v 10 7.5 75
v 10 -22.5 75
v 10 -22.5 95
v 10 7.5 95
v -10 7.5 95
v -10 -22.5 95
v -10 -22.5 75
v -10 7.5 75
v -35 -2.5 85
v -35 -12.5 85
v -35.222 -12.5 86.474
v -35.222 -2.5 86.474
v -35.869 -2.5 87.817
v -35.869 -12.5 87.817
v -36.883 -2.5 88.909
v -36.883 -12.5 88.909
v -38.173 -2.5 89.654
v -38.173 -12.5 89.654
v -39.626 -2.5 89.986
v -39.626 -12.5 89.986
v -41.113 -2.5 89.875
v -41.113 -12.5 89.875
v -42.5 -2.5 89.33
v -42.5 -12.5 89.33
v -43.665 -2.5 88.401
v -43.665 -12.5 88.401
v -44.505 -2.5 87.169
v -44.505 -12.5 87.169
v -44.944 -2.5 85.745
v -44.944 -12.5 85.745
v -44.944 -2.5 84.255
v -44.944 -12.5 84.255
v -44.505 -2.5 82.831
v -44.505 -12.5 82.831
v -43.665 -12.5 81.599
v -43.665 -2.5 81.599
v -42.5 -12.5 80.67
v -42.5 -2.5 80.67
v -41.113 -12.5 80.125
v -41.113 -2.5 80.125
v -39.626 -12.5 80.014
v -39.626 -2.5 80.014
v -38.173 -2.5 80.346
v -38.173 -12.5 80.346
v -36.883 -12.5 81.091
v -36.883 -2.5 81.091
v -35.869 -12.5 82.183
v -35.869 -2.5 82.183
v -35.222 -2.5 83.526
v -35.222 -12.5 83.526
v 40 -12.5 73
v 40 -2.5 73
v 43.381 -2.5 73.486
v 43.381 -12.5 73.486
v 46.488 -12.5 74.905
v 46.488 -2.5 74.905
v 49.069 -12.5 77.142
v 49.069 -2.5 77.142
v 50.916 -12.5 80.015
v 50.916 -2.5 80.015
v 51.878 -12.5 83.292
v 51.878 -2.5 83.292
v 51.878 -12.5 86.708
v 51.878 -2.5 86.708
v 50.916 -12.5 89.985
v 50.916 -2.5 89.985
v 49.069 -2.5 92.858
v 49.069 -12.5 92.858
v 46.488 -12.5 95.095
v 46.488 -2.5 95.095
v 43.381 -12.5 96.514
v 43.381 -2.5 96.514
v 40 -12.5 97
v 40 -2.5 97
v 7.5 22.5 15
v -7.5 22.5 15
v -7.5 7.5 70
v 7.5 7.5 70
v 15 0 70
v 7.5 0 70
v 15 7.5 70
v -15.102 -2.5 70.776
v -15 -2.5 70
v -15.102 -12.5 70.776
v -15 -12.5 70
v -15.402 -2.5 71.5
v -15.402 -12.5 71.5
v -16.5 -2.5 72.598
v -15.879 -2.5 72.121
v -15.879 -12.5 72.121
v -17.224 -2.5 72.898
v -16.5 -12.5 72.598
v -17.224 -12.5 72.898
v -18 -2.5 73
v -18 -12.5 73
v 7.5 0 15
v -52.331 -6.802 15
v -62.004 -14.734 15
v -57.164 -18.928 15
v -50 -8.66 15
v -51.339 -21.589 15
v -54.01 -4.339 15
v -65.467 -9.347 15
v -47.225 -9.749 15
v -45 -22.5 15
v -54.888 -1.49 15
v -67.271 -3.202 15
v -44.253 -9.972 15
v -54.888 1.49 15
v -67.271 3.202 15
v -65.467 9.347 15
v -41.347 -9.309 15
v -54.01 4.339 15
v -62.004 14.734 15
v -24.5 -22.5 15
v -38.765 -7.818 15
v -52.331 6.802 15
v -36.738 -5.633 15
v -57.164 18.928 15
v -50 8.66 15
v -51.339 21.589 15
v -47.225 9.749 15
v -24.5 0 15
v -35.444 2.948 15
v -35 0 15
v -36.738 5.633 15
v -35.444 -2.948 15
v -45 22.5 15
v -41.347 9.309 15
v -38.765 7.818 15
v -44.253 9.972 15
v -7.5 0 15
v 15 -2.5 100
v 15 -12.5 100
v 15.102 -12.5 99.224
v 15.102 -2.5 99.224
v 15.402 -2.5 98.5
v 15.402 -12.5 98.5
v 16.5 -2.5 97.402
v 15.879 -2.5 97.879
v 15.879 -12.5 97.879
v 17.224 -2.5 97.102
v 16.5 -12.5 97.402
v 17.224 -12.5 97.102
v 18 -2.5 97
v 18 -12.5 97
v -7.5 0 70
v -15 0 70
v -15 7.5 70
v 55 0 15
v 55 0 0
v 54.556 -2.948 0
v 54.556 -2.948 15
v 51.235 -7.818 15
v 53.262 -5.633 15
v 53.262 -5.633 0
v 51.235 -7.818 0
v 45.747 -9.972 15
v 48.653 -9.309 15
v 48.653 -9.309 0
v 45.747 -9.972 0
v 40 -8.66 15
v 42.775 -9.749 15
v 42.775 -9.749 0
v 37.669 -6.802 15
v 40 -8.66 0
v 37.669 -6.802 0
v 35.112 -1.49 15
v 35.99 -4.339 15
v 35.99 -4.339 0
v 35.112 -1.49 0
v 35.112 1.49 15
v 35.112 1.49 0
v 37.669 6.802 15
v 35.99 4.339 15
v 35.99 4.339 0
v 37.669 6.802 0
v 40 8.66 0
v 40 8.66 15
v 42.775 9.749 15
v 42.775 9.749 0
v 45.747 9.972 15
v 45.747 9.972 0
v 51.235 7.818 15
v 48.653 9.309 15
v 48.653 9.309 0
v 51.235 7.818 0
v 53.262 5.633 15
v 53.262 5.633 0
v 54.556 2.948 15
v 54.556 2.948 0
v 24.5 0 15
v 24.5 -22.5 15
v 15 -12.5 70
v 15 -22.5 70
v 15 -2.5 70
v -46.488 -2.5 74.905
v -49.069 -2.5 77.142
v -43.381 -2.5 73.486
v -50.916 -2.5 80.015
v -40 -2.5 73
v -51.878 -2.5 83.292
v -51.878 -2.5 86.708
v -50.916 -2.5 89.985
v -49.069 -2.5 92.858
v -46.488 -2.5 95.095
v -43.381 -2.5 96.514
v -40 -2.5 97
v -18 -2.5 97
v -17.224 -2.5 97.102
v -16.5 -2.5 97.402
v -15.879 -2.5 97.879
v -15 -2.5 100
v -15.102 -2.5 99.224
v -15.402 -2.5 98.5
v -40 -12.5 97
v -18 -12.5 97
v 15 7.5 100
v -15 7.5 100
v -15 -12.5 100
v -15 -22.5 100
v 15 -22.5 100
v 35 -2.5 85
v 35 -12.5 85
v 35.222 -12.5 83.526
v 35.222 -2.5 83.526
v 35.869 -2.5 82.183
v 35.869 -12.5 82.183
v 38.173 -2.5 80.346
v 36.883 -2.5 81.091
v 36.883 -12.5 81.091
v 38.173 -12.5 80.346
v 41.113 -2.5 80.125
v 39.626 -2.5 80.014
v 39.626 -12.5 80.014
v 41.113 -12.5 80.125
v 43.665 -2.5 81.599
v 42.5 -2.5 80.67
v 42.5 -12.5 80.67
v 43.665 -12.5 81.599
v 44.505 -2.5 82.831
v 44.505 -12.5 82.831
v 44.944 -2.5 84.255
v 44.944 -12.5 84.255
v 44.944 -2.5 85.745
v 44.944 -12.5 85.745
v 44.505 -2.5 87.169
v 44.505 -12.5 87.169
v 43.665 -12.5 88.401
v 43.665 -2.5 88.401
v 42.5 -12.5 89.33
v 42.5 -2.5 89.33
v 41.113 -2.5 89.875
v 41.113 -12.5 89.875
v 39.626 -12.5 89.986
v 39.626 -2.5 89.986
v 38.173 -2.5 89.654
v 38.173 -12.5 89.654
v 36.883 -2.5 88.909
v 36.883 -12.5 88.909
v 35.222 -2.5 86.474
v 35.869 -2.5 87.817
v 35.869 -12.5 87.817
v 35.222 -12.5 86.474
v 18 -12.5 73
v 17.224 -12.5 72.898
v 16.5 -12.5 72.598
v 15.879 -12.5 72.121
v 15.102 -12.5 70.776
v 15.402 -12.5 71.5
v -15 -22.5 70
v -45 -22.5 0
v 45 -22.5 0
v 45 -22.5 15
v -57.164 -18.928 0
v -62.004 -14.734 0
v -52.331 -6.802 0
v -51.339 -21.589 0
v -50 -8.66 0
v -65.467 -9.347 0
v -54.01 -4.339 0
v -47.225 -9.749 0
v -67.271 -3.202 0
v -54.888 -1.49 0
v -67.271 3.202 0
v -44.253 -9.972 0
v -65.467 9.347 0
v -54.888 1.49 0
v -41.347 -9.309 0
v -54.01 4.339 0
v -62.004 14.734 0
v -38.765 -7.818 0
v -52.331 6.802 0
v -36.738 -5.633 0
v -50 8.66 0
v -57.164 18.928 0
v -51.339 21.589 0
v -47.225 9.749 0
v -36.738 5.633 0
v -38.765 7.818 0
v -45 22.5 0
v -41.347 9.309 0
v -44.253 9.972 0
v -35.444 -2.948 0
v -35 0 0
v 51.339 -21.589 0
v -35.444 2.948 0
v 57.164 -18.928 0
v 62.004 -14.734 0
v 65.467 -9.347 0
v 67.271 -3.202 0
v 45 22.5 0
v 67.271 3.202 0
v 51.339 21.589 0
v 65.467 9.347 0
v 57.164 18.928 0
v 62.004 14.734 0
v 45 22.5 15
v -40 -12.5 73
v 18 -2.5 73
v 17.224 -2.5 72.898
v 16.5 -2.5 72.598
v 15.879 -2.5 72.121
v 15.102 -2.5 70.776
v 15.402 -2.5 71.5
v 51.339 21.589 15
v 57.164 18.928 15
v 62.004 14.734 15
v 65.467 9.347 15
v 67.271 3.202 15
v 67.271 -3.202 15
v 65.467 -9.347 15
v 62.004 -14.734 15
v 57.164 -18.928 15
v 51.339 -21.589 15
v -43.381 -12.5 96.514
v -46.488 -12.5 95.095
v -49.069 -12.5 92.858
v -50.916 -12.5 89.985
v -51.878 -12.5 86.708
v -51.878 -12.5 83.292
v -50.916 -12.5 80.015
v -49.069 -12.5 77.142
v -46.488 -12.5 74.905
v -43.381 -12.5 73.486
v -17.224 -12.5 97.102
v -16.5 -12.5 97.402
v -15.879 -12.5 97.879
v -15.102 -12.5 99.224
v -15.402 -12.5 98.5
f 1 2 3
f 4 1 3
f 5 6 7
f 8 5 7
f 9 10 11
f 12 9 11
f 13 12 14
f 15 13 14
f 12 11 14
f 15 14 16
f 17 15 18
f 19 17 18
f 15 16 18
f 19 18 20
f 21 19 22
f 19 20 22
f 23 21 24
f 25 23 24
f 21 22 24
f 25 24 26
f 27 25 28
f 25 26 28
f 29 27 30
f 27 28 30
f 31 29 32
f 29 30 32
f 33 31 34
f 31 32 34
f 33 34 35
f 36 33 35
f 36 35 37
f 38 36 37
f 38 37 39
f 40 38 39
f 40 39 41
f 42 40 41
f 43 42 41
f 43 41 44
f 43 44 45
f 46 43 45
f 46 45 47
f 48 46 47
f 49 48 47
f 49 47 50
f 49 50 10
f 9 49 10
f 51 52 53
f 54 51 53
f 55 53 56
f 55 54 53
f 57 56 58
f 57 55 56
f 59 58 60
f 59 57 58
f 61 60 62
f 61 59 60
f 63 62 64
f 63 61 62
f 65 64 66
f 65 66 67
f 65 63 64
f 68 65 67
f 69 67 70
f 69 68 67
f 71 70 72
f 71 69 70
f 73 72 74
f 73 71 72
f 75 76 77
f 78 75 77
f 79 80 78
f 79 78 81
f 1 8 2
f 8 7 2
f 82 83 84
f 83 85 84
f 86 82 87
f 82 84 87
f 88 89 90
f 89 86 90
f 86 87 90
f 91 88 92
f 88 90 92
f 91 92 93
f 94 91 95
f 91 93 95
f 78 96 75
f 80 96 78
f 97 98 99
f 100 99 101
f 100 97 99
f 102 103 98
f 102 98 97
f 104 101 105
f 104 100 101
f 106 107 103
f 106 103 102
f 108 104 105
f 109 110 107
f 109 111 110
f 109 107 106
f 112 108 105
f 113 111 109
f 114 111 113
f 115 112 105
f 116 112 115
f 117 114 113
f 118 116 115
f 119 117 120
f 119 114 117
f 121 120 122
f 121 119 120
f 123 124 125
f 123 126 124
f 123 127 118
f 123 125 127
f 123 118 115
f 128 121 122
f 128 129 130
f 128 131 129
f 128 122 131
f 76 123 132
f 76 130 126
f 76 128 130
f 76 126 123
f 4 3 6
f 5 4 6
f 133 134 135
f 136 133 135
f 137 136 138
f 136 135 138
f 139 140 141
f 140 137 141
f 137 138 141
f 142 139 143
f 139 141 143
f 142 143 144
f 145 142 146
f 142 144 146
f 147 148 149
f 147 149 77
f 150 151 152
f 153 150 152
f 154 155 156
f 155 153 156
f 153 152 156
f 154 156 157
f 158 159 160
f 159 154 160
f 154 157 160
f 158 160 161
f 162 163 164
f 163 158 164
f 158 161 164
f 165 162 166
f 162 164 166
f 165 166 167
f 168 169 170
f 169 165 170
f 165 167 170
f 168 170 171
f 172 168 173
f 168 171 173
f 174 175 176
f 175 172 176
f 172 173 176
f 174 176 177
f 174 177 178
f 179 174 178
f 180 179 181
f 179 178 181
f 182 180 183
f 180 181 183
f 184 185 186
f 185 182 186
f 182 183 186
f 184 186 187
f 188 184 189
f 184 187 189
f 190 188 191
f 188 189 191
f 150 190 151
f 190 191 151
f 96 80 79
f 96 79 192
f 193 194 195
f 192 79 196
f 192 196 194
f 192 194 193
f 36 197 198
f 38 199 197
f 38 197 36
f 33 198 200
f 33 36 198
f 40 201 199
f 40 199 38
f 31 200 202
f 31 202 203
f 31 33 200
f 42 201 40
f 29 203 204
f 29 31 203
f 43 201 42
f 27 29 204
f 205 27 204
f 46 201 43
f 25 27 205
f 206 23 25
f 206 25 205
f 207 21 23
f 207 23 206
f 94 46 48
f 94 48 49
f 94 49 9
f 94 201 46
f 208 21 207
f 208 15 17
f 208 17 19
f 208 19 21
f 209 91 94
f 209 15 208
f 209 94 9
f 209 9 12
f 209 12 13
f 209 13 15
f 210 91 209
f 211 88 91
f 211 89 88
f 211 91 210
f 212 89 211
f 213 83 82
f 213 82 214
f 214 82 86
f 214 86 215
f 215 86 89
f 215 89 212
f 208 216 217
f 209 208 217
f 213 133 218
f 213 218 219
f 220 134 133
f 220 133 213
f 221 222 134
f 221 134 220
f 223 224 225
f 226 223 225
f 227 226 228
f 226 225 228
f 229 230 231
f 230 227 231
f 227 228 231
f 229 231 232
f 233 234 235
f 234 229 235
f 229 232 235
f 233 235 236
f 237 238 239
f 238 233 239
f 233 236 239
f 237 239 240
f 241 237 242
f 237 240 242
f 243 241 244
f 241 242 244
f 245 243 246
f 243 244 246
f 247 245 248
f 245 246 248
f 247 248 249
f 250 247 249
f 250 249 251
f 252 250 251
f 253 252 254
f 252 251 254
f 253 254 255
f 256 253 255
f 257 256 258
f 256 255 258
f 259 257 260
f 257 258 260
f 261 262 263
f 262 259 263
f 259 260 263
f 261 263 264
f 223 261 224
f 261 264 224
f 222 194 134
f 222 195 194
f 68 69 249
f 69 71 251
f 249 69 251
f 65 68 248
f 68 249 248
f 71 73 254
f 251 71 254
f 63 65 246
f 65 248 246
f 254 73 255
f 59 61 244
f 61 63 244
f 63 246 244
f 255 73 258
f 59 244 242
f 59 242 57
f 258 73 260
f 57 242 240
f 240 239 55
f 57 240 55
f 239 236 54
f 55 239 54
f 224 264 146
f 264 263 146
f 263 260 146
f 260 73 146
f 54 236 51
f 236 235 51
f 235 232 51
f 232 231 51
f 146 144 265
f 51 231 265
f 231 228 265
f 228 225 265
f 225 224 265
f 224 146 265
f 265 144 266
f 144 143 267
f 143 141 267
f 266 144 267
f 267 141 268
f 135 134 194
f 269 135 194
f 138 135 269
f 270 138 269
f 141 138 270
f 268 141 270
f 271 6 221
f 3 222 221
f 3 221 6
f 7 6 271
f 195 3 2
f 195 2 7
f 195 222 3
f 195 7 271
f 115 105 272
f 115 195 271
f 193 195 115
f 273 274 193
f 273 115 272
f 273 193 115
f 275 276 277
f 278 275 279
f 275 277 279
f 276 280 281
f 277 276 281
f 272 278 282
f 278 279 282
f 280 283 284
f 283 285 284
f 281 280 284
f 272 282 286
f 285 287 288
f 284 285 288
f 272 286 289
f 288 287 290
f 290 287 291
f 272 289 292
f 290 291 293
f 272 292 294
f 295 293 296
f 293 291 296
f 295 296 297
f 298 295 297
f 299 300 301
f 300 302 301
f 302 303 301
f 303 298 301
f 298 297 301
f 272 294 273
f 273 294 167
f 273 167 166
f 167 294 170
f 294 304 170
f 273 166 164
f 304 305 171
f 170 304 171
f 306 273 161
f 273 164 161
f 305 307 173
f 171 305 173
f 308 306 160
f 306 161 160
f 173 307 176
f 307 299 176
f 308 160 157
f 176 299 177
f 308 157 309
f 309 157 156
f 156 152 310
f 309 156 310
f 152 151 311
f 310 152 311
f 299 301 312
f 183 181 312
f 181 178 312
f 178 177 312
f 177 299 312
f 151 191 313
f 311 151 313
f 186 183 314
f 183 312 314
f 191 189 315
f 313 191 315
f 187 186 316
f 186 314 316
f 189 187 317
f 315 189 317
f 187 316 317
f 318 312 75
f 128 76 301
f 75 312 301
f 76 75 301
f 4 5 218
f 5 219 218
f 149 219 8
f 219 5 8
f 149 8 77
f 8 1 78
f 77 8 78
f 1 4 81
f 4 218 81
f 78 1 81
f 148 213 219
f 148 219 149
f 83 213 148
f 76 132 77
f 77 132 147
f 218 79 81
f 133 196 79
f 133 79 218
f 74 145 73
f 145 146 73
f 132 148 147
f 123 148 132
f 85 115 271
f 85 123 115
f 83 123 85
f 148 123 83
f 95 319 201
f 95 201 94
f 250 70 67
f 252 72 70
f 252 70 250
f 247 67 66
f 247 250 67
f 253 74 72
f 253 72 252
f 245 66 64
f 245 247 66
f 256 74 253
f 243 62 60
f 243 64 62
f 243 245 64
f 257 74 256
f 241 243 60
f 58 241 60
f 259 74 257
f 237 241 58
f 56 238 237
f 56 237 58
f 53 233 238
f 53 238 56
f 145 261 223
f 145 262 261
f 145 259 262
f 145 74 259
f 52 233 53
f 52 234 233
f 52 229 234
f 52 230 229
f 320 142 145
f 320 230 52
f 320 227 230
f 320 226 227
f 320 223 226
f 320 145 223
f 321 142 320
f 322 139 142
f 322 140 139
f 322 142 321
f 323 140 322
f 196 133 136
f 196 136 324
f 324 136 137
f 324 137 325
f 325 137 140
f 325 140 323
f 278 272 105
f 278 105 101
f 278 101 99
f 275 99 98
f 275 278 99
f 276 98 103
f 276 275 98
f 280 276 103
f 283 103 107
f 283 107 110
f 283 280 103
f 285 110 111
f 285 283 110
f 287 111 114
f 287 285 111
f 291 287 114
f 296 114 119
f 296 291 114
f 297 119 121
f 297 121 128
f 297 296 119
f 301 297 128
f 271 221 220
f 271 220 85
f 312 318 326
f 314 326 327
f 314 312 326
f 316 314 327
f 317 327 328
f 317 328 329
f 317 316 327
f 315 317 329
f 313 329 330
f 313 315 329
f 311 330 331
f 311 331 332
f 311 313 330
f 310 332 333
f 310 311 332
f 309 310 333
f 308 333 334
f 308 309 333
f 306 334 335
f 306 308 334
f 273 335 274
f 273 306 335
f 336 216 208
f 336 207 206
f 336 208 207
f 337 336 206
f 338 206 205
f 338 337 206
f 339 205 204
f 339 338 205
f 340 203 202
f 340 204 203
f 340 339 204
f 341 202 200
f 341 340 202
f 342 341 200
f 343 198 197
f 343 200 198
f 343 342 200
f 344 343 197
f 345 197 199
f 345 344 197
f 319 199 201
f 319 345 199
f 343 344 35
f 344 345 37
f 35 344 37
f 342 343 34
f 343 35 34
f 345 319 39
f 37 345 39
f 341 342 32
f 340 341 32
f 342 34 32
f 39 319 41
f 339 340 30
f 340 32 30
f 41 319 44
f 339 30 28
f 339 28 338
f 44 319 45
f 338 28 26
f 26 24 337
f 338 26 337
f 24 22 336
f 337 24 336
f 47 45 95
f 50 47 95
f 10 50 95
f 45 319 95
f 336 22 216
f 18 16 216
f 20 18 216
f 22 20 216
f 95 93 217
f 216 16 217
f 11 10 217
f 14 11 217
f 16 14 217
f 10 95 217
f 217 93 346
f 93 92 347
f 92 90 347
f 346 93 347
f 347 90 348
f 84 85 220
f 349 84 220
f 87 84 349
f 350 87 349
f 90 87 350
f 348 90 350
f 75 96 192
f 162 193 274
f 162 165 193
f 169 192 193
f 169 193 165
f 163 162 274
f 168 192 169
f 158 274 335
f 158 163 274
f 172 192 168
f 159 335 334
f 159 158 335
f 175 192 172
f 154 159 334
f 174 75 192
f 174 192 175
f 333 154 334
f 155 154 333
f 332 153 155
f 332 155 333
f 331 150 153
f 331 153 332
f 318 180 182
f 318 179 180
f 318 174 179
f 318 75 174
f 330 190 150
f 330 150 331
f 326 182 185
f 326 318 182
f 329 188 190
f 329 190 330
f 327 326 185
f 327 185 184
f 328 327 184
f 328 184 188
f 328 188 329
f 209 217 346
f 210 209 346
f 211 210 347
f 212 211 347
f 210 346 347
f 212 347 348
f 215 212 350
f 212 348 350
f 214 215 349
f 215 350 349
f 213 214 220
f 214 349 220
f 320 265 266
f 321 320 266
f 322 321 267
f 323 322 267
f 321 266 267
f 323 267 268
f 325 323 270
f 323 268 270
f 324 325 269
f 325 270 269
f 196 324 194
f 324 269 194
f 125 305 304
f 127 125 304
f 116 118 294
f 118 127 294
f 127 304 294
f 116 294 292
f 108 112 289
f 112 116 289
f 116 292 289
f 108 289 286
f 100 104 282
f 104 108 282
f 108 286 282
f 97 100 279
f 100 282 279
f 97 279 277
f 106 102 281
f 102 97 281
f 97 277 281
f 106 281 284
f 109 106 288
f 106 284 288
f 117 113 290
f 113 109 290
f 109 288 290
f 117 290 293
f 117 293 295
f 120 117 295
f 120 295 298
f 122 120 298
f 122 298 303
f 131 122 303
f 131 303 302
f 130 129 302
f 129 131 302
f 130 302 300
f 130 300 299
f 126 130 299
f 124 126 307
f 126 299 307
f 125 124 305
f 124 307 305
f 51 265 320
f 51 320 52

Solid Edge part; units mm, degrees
sketch "Sketch1" plane through (0, 0, 0) normal (0, 0, 1) x (1, 0, 0)
  line L0 (-45, -22.5) -> (45, -22.5)
  line L1 (45, 22.5) -> (-45, 22.5)
  arc A0 (45, 22.5) -> (45, -22.5) centre (45, 0) cw
  arc A1 (-45, -22.5) -> (-45, 22.5) centre (-45, 0) cw
  circle A2 centre (-45, 0) radius 10
  circle A3 centre (45, 0) radius 10
extrude "Protrusion1" add sketch "Sketch1" along normal blind 15
sketch "Sketch2" plane through (0, -22.5, 7.5) normal (0, -1, 0) x (1, 0, 0)
  line L0 (15, 92.5) -> (-15, 92.5)
  line L1 (-15, 92.5) -> (-15, 62.5)
  line L2 (-15, 62.5) -> (15, 62.5)
  line L3 (15, 62.5) -> (15, 92.5)
  line L4 (10, 87.5) -> (-10, 87.5)
  line L5 (-10, 87.5) -> (-10, 67.5)
  line L6 (-10, 67.5) -> (10, 67.5)
  line L7 (10, 67.5) -> (10, 87.5)
extrude "ExtrudedProtrusion_2" add sketch "Sketch2" against normal blind 30
sketch "Sketch3" plane through (0, -12.5, 7.5) normal (0, -1, 0) x (1, 0, 0)
  line L0 (-40, 89.5) -> (-18, 89.5)
  arc A0 (-18, 89.5) -> (-15, 92.5) centre (-18, 92.5) ccw
  line L1 (-15, 62.5) -> (-15, 92.5)
  arc A1 (-18, 65.5) -> (-15, 62.5) centre (-18, 62.5) cw
  line L2 (-40, 65.5) -> (-18, 65.5)
  arc A2 (-40, 65.5) -> (-40, 89.5) centre (-40, 77.5) cw
  circle A3 centre (-40, 77.5) radius 5
extrude "ExtrudedProtrusion_3" add sketch "Sketch3" against normal blind 10
sketch "Sketch4" plane through (0, 0, 0) normal (0, -1, 0) x (1, 0, 0)
  line L0 (-24.5, 15) -> (-15, 70)
  line L1 (-15, 70) -> (0, 70)
  line L2 (0, 70) -> (0, 15)
  line L3 (0, 15) -> (-24.5, 15)
extrude "Protrusion2" add sketch "Sketch4" along normal up to vertex (22.5 mm away)
mirror "Mirror1" about plane through (0, 0, 0) normal (1, 0, 0) of "Protrusion2", "ExtrudedProtrusion_3"
sketch "Sketch5" plane through (0, 0, 0) normal (1, 0, 0) x (0, 1, 0)
  line L0 (22.5, 15) -> (7.5, 70)
  line L1 (7.5, 70) -> (0, 70)
  line L2 (0, 70) -> (0, 15)
  line L3 (0, 15) -> (22.5, 15)
extrude "ExtrudedProtrusion_9" add sketch "Sketch5" along normal mid plane 15
